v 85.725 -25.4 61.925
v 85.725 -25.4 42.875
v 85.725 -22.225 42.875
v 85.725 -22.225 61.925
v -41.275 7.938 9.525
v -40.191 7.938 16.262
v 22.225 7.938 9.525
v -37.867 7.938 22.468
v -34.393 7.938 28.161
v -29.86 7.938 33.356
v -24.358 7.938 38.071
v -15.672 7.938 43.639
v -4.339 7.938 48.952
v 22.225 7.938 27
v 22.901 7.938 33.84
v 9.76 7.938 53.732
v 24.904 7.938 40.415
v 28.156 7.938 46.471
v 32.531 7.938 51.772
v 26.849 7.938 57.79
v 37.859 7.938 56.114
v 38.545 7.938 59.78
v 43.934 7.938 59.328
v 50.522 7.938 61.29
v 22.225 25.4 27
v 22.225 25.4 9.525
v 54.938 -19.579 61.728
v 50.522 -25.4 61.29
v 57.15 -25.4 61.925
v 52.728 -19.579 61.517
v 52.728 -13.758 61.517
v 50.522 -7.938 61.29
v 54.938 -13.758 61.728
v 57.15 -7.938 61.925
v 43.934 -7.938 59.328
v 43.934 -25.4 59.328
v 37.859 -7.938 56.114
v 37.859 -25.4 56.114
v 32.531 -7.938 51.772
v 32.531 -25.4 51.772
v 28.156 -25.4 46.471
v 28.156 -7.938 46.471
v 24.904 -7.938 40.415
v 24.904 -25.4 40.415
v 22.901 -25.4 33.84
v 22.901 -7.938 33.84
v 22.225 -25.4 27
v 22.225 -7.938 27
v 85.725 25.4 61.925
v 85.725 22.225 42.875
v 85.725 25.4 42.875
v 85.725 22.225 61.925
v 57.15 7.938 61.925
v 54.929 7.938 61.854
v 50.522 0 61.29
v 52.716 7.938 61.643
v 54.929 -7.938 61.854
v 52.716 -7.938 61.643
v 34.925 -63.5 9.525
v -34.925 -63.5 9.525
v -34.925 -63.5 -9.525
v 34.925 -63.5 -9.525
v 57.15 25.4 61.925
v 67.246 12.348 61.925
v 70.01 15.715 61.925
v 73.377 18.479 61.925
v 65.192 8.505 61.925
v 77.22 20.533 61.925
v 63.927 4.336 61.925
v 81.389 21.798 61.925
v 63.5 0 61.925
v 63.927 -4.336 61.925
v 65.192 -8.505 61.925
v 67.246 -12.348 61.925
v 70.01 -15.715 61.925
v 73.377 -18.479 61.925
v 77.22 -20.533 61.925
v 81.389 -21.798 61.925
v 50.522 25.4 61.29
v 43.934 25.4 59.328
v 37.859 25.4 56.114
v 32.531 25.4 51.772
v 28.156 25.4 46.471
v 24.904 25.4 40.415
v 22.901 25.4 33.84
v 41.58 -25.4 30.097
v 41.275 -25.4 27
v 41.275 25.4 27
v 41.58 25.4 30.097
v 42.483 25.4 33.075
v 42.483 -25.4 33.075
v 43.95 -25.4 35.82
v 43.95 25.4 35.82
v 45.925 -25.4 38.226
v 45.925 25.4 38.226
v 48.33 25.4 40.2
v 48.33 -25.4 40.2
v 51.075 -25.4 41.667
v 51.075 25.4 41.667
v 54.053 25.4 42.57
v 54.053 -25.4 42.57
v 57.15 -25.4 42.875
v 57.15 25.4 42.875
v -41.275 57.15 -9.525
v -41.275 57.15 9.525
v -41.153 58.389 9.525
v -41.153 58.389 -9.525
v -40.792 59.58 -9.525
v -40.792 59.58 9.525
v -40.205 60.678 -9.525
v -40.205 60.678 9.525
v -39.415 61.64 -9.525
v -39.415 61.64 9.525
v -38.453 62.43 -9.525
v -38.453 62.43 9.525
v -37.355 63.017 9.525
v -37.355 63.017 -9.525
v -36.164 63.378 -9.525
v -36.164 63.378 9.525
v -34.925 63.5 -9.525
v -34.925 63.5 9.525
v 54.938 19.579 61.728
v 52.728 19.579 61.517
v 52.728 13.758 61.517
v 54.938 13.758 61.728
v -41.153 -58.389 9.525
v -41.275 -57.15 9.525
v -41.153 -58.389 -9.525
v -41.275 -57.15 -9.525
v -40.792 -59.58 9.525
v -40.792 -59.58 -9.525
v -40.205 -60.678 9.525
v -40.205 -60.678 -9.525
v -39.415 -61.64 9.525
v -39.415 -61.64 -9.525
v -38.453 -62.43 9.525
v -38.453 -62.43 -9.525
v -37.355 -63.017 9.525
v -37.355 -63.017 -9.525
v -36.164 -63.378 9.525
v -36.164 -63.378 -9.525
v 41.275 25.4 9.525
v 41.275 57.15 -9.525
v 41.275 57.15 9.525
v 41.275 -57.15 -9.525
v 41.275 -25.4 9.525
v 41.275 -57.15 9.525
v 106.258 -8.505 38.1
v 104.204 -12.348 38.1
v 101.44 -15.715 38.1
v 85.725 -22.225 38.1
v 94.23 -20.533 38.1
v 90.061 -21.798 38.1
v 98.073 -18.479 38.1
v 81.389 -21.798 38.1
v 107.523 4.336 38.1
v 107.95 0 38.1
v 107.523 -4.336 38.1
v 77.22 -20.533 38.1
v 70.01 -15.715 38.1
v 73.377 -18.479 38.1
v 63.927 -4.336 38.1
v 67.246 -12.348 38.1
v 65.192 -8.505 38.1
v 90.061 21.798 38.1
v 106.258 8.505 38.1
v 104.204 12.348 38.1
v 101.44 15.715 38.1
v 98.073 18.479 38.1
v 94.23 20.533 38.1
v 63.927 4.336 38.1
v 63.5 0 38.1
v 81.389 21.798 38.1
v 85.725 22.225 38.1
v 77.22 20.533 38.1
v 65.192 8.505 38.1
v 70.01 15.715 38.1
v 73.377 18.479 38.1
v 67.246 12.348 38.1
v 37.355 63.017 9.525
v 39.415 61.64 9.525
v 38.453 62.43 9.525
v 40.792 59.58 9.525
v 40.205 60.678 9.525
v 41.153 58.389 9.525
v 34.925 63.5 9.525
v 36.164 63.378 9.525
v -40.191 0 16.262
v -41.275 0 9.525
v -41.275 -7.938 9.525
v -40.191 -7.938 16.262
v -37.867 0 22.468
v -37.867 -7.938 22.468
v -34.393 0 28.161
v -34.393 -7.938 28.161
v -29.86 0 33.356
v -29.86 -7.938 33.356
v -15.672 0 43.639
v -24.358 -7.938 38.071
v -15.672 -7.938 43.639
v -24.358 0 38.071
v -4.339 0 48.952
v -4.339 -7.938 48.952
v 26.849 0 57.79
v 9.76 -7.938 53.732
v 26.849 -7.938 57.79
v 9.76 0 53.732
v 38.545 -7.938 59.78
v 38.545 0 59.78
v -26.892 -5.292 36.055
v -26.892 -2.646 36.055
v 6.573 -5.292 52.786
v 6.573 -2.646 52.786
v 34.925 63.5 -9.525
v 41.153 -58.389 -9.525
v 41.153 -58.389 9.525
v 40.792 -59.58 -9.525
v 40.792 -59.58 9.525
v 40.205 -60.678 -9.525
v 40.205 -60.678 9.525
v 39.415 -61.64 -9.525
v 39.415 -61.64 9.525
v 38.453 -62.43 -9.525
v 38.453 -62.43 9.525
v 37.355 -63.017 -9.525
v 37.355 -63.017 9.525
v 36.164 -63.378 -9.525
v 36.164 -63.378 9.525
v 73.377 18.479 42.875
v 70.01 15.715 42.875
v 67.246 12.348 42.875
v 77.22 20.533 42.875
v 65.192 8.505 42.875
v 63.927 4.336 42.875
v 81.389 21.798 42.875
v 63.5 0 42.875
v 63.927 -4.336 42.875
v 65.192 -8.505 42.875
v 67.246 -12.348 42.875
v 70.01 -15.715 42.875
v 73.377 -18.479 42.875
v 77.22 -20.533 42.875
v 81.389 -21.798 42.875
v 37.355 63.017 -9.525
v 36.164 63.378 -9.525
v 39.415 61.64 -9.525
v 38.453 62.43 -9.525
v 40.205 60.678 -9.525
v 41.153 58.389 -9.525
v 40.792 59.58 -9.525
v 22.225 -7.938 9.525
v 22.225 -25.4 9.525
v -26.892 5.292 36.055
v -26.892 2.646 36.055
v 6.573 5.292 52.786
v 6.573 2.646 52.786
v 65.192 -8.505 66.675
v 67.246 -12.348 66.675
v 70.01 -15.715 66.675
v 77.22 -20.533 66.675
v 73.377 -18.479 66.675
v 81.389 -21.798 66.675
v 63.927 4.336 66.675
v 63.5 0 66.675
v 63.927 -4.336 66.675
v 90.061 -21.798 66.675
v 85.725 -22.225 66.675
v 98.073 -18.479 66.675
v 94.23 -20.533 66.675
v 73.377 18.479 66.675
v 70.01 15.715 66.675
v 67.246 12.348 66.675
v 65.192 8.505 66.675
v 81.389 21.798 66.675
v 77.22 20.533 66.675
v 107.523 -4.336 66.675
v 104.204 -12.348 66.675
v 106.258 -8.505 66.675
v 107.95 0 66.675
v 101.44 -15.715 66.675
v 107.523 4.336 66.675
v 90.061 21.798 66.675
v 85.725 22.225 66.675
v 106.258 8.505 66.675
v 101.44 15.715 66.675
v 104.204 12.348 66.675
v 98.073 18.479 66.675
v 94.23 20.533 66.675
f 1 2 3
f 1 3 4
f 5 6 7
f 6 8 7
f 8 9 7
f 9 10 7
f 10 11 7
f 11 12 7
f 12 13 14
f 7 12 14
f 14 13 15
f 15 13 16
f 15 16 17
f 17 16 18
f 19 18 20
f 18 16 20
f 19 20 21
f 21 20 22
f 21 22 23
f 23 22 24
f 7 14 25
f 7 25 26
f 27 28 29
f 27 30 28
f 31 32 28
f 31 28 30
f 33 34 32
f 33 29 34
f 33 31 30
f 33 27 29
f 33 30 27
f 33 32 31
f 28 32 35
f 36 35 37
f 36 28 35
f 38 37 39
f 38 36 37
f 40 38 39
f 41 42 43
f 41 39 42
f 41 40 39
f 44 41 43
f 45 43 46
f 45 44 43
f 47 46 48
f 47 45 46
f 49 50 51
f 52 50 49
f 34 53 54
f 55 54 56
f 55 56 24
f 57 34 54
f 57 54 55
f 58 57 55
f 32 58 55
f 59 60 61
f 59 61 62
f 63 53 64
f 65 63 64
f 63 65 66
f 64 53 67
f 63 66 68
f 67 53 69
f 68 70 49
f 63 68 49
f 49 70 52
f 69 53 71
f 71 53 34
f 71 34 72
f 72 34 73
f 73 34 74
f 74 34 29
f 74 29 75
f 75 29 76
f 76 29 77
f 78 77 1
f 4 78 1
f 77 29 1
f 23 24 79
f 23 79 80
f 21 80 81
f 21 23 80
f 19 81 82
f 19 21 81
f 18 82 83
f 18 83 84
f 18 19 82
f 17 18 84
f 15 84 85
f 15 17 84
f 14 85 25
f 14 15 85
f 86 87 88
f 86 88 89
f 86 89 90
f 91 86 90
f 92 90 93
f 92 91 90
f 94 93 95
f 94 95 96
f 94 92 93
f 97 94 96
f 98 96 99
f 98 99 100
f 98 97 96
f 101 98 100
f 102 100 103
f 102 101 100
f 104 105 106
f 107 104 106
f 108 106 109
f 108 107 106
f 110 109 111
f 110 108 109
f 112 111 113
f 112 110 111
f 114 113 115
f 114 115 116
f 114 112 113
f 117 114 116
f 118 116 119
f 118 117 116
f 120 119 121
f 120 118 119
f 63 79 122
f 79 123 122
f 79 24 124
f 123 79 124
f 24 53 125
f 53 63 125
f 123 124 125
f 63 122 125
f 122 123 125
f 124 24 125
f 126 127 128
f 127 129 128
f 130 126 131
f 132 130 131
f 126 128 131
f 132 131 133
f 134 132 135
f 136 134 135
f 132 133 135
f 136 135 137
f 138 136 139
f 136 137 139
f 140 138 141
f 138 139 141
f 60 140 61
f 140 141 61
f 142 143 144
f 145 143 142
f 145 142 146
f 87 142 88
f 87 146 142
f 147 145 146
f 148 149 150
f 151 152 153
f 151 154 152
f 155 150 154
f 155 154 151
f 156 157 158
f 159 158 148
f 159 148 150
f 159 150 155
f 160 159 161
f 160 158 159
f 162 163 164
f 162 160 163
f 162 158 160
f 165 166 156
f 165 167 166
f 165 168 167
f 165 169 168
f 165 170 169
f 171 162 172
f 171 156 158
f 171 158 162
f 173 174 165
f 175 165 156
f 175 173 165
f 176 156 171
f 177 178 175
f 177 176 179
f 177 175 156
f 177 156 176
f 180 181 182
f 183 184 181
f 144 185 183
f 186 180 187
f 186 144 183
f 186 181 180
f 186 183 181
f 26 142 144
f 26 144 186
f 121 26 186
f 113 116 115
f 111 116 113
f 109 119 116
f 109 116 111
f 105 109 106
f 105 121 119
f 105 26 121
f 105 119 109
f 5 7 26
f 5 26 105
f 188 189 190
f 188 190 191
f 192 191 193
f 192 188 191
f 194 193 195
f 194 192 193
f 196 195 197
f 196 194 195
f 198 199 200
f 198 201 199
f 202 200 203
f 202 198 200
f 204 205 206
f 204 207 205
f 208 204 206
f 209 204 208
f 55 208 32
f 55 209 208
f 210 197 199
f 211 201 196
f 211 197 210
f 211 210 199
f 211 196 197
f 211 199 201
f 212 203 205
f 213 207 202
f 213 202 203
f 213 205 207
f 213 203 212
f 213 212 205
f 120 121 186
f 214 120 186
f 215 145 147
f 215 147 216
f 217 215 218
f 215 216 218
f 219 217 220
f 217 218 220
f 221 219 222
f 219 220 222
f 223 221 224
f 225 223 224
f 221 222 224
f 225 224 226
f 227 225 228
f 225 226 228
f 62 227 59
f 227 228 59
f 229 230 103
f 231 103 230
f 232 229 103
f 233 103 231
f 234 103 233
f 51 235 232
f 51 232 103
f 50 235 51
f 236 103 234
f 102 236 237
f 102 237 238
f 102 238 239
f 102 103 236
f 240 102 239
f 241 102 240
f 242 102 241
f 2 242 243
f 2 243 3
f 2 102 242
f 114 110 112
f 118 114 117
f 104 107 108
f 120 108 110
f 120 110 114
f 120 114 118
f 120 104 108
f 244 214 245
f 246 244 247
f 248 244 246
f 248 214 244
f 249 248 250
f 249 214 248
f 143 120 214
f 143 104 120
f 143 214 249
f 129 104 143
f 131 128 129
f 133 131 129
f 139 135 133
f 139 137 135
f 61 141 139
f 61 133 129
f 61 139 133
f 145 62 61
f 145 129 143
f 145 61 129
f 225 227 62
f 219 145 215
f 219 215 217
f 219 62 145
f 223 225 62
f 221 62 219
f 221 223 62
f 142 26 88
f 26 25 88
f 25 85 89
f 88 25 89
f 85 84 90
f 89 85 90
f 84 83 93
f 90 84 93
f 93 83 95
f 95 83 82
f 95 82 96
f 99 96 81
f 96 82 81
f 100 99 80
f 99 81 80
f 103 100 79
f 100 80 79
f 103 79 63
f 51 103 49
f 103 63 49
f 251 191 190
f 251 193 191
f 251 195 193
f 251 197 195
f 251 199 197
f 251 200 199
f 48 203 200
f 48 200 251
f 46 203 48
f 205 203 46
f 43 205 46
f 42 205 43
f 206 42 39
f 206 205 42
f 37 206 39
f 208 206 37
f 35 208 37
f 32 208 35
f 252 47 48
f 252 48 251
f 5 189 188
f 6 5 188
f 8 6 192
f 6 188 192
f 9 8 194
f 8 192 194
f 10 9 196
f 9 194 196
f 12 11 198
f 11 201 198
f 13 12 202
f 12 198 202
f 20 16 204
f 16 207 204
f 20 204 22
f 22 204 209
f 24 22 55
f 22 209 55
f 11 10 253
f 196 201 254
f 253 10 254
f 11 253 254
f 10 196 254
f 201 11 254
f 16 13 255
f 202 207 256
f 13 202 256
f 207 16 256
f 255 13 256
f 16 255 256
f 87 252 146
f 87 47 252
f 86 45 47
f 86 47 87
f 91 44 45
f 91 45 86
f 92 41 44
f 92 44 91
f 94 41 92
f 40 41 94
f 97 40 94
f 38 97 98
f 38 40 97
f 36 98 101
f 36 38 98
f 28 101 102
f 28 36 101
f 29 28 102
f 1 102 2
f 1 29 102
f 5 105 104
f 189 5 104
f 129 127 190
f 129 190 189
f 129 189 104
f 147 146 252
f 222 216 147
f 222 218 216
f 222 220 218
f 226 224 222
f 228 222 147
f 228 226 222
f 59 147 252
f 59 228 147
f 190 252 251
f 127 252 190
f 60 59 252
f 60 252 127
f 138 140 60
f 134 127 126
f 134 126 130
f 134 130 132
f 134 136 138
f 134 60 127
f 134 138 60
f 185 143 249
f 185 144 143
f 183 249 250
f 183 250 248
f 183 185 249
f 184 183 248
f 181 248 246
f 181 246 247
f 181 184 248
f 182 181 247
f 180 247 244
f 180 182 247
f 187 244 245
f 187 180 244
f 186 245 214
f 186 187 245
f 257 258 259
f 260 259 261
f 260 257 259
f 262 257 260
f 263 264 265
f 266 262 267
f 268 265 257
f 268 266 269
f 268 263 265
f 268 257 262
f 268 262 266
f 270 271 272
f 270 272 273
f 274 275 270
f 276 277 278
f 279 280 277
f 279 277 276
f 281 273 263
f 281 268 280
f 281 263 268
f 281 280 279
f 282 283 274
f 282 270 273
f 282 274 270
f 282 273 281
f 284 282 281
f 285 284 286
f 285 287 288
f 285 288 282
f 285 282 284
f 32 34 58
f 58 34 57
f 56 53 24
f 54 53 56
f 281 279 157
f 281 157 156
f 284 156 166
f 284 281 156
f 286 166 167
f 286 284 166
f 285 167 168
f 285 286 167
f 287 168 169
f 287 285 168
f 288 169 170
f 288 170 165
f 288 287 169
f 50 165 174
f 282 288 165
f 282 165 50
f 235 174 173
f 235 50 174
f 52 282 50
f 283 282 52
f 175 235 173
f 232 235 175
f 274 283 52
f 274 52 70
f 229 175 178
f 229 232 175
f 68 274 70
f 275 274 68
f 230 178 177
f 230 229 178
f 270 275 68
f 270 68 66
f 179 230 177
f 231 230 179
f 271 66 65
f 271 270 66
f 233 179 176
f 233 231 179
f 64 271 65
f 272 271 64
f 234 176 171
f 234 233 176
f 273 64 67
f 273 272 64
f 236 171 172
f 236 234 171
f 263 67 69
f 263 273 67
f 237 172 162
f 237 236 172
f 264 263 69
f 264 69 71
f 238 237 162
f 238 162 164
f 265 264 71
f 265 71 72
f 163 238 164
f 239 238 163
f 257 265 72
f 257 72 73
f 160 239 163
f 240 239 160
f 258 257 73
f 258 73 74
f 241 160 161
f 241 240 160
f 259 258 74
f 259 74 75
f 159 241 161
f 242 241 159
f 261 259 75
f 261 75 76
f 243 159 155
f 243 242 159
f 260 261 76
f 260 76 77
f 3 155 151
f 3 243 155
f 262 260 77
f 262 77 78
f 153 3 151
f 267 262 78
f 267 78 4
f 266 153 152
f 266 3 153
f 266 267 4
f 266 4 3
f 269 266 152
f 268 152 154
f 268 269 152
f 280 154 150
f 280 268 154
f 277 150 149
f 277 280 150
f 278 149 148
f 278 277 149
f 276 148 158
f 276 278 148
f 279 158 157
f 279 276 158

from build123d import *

# Parameters (mm, degrees)
F1_DEPTH = 63.5
F0_W     = 28.575
F0_H     = 19.05
F2_DEPTH = 25.4
F3_DEPTH = 7.9375
F5_R     = 6.35


with BuildPart() as f1:
    # F0 (on Front) → F1 (new body, symmetric)
    with BuildSketch(Plane.XZ):
        Polygon((41.275, -9.525), (41.275, 9.525), (22.225, 9.525), (-41.275, 9.525), (-41.275, -9.525), align=None)
    extrude(amount=F1_DEPTH, both=True)

    # F0 (on Front) → F2 (join, symmetric)
    with BuildSketch(Plane.XZ):
        with BuildLine():
            Line((22.225, 9.525), (41.275, 9.525))
            Line((41.275, 9.525), (41.275, 27.0002))
            ThreePointArc((41.275, 27.0002), (45.9246798487, 38.2255201513), (57.15, 42.8752))
            Line((57.15, 42.8752), (57.15, 61.9252))
            add(Edge.make_bspline(
                [(50.521689096, 61.29044817), (52.7261125358, 61.5243781465), (54.9369393602, 61.735707874), (57.15, 61.9252)],
                knots=[106.439422351, 106.439422351, 106.439422351, 106.439422351, 111.5045361635, 111.5045361635, 111.5045361635, 111.5045361635], degree=3))
            ThreePointArc((50.521689096, 61.29044817), (30.2125782291, 49.2292560605), (22.225, 27.0002))
            Line((22.225, 27.0002), (22.225, 9.525))
        make_face()
        with Locations((71.4375, 52.4002)):
            Rectangle(F0_W, F0_H)
    extrude(amount=F2_DEPTH, both=True)

    # F0 (on Front) → F3 (join, symmetric)
    with BuildSketch(Plane.XZ):
        with BuildLine():
            ThreePointArc((57.15, 61.9252), (53.8206826779, 61.7661498816), (50.521689096, 61.29044817))
            add(Edge.make_bspline(
                [(50.521689096, 61.29044817), (52.7261125358, 61.5243781465), (54.9369393602, 61.735707874), (57.15, 61.9252)],
                knots=[106.439422351, 106.439422351, 106.439422351, 106.439422351, 111.5045361635, 111.5045361635, 111.5045361635, 111.5045361635], degree=3))
        make_face()
        Polygon((41.275, -9.525), (41.275, 9.525), (22.225, 9.525), (-41.275, 9.525), (-41.275, -9.525), align=None)
        with BuildLine():
            Line((-41.275, 9.525), (22.225, 9.525))
            Line((22.225, 9.525), (22.225, 27.0002))
            ThreePointArc((22.225, 27.0002), (30.2125782291, 49.2292560605), (50.521689096, 61.29044817))
            add(Edge.make_bspline(
                [(-41.275, 9.525), (-39.2990761683, 41.4785222008), (4.1974471864, 56.3745918841), (50.521689096, 61.29044817)],
                knots=[0, 0, 0, 0, 106.439422351, 106.439422351, 106.439422351, 106.439422351], degree=3))
        make_face()
    extrude(amount=F3_DEPTH, both=True)

    # F0 (on Front) → F4 (revolve)
    with BuildSketch(Plane.XZ):
        Polygon((85.725, 61.9252), (85.725, 42.8752), (85.725, 38.1), (107.95, 38.1), (107.95, 66.675), (85.725, 66.675), align=None)
    revolve(axis=Axis((85.725, 0, 52.3875), (0, 0, 1)))

    # F5
    f5_edges = [f1.edges().sort_by_distance(p)[0] for p in [
        (-41.275, 63.5, 0),
        (41.275, 63.5, 0),
        (-41.275, -63.5, 0),
        (41.275, -63.5, 0),
    ]]
    fillet(f5_edges, radius=F5_R)


solid = f1.part
